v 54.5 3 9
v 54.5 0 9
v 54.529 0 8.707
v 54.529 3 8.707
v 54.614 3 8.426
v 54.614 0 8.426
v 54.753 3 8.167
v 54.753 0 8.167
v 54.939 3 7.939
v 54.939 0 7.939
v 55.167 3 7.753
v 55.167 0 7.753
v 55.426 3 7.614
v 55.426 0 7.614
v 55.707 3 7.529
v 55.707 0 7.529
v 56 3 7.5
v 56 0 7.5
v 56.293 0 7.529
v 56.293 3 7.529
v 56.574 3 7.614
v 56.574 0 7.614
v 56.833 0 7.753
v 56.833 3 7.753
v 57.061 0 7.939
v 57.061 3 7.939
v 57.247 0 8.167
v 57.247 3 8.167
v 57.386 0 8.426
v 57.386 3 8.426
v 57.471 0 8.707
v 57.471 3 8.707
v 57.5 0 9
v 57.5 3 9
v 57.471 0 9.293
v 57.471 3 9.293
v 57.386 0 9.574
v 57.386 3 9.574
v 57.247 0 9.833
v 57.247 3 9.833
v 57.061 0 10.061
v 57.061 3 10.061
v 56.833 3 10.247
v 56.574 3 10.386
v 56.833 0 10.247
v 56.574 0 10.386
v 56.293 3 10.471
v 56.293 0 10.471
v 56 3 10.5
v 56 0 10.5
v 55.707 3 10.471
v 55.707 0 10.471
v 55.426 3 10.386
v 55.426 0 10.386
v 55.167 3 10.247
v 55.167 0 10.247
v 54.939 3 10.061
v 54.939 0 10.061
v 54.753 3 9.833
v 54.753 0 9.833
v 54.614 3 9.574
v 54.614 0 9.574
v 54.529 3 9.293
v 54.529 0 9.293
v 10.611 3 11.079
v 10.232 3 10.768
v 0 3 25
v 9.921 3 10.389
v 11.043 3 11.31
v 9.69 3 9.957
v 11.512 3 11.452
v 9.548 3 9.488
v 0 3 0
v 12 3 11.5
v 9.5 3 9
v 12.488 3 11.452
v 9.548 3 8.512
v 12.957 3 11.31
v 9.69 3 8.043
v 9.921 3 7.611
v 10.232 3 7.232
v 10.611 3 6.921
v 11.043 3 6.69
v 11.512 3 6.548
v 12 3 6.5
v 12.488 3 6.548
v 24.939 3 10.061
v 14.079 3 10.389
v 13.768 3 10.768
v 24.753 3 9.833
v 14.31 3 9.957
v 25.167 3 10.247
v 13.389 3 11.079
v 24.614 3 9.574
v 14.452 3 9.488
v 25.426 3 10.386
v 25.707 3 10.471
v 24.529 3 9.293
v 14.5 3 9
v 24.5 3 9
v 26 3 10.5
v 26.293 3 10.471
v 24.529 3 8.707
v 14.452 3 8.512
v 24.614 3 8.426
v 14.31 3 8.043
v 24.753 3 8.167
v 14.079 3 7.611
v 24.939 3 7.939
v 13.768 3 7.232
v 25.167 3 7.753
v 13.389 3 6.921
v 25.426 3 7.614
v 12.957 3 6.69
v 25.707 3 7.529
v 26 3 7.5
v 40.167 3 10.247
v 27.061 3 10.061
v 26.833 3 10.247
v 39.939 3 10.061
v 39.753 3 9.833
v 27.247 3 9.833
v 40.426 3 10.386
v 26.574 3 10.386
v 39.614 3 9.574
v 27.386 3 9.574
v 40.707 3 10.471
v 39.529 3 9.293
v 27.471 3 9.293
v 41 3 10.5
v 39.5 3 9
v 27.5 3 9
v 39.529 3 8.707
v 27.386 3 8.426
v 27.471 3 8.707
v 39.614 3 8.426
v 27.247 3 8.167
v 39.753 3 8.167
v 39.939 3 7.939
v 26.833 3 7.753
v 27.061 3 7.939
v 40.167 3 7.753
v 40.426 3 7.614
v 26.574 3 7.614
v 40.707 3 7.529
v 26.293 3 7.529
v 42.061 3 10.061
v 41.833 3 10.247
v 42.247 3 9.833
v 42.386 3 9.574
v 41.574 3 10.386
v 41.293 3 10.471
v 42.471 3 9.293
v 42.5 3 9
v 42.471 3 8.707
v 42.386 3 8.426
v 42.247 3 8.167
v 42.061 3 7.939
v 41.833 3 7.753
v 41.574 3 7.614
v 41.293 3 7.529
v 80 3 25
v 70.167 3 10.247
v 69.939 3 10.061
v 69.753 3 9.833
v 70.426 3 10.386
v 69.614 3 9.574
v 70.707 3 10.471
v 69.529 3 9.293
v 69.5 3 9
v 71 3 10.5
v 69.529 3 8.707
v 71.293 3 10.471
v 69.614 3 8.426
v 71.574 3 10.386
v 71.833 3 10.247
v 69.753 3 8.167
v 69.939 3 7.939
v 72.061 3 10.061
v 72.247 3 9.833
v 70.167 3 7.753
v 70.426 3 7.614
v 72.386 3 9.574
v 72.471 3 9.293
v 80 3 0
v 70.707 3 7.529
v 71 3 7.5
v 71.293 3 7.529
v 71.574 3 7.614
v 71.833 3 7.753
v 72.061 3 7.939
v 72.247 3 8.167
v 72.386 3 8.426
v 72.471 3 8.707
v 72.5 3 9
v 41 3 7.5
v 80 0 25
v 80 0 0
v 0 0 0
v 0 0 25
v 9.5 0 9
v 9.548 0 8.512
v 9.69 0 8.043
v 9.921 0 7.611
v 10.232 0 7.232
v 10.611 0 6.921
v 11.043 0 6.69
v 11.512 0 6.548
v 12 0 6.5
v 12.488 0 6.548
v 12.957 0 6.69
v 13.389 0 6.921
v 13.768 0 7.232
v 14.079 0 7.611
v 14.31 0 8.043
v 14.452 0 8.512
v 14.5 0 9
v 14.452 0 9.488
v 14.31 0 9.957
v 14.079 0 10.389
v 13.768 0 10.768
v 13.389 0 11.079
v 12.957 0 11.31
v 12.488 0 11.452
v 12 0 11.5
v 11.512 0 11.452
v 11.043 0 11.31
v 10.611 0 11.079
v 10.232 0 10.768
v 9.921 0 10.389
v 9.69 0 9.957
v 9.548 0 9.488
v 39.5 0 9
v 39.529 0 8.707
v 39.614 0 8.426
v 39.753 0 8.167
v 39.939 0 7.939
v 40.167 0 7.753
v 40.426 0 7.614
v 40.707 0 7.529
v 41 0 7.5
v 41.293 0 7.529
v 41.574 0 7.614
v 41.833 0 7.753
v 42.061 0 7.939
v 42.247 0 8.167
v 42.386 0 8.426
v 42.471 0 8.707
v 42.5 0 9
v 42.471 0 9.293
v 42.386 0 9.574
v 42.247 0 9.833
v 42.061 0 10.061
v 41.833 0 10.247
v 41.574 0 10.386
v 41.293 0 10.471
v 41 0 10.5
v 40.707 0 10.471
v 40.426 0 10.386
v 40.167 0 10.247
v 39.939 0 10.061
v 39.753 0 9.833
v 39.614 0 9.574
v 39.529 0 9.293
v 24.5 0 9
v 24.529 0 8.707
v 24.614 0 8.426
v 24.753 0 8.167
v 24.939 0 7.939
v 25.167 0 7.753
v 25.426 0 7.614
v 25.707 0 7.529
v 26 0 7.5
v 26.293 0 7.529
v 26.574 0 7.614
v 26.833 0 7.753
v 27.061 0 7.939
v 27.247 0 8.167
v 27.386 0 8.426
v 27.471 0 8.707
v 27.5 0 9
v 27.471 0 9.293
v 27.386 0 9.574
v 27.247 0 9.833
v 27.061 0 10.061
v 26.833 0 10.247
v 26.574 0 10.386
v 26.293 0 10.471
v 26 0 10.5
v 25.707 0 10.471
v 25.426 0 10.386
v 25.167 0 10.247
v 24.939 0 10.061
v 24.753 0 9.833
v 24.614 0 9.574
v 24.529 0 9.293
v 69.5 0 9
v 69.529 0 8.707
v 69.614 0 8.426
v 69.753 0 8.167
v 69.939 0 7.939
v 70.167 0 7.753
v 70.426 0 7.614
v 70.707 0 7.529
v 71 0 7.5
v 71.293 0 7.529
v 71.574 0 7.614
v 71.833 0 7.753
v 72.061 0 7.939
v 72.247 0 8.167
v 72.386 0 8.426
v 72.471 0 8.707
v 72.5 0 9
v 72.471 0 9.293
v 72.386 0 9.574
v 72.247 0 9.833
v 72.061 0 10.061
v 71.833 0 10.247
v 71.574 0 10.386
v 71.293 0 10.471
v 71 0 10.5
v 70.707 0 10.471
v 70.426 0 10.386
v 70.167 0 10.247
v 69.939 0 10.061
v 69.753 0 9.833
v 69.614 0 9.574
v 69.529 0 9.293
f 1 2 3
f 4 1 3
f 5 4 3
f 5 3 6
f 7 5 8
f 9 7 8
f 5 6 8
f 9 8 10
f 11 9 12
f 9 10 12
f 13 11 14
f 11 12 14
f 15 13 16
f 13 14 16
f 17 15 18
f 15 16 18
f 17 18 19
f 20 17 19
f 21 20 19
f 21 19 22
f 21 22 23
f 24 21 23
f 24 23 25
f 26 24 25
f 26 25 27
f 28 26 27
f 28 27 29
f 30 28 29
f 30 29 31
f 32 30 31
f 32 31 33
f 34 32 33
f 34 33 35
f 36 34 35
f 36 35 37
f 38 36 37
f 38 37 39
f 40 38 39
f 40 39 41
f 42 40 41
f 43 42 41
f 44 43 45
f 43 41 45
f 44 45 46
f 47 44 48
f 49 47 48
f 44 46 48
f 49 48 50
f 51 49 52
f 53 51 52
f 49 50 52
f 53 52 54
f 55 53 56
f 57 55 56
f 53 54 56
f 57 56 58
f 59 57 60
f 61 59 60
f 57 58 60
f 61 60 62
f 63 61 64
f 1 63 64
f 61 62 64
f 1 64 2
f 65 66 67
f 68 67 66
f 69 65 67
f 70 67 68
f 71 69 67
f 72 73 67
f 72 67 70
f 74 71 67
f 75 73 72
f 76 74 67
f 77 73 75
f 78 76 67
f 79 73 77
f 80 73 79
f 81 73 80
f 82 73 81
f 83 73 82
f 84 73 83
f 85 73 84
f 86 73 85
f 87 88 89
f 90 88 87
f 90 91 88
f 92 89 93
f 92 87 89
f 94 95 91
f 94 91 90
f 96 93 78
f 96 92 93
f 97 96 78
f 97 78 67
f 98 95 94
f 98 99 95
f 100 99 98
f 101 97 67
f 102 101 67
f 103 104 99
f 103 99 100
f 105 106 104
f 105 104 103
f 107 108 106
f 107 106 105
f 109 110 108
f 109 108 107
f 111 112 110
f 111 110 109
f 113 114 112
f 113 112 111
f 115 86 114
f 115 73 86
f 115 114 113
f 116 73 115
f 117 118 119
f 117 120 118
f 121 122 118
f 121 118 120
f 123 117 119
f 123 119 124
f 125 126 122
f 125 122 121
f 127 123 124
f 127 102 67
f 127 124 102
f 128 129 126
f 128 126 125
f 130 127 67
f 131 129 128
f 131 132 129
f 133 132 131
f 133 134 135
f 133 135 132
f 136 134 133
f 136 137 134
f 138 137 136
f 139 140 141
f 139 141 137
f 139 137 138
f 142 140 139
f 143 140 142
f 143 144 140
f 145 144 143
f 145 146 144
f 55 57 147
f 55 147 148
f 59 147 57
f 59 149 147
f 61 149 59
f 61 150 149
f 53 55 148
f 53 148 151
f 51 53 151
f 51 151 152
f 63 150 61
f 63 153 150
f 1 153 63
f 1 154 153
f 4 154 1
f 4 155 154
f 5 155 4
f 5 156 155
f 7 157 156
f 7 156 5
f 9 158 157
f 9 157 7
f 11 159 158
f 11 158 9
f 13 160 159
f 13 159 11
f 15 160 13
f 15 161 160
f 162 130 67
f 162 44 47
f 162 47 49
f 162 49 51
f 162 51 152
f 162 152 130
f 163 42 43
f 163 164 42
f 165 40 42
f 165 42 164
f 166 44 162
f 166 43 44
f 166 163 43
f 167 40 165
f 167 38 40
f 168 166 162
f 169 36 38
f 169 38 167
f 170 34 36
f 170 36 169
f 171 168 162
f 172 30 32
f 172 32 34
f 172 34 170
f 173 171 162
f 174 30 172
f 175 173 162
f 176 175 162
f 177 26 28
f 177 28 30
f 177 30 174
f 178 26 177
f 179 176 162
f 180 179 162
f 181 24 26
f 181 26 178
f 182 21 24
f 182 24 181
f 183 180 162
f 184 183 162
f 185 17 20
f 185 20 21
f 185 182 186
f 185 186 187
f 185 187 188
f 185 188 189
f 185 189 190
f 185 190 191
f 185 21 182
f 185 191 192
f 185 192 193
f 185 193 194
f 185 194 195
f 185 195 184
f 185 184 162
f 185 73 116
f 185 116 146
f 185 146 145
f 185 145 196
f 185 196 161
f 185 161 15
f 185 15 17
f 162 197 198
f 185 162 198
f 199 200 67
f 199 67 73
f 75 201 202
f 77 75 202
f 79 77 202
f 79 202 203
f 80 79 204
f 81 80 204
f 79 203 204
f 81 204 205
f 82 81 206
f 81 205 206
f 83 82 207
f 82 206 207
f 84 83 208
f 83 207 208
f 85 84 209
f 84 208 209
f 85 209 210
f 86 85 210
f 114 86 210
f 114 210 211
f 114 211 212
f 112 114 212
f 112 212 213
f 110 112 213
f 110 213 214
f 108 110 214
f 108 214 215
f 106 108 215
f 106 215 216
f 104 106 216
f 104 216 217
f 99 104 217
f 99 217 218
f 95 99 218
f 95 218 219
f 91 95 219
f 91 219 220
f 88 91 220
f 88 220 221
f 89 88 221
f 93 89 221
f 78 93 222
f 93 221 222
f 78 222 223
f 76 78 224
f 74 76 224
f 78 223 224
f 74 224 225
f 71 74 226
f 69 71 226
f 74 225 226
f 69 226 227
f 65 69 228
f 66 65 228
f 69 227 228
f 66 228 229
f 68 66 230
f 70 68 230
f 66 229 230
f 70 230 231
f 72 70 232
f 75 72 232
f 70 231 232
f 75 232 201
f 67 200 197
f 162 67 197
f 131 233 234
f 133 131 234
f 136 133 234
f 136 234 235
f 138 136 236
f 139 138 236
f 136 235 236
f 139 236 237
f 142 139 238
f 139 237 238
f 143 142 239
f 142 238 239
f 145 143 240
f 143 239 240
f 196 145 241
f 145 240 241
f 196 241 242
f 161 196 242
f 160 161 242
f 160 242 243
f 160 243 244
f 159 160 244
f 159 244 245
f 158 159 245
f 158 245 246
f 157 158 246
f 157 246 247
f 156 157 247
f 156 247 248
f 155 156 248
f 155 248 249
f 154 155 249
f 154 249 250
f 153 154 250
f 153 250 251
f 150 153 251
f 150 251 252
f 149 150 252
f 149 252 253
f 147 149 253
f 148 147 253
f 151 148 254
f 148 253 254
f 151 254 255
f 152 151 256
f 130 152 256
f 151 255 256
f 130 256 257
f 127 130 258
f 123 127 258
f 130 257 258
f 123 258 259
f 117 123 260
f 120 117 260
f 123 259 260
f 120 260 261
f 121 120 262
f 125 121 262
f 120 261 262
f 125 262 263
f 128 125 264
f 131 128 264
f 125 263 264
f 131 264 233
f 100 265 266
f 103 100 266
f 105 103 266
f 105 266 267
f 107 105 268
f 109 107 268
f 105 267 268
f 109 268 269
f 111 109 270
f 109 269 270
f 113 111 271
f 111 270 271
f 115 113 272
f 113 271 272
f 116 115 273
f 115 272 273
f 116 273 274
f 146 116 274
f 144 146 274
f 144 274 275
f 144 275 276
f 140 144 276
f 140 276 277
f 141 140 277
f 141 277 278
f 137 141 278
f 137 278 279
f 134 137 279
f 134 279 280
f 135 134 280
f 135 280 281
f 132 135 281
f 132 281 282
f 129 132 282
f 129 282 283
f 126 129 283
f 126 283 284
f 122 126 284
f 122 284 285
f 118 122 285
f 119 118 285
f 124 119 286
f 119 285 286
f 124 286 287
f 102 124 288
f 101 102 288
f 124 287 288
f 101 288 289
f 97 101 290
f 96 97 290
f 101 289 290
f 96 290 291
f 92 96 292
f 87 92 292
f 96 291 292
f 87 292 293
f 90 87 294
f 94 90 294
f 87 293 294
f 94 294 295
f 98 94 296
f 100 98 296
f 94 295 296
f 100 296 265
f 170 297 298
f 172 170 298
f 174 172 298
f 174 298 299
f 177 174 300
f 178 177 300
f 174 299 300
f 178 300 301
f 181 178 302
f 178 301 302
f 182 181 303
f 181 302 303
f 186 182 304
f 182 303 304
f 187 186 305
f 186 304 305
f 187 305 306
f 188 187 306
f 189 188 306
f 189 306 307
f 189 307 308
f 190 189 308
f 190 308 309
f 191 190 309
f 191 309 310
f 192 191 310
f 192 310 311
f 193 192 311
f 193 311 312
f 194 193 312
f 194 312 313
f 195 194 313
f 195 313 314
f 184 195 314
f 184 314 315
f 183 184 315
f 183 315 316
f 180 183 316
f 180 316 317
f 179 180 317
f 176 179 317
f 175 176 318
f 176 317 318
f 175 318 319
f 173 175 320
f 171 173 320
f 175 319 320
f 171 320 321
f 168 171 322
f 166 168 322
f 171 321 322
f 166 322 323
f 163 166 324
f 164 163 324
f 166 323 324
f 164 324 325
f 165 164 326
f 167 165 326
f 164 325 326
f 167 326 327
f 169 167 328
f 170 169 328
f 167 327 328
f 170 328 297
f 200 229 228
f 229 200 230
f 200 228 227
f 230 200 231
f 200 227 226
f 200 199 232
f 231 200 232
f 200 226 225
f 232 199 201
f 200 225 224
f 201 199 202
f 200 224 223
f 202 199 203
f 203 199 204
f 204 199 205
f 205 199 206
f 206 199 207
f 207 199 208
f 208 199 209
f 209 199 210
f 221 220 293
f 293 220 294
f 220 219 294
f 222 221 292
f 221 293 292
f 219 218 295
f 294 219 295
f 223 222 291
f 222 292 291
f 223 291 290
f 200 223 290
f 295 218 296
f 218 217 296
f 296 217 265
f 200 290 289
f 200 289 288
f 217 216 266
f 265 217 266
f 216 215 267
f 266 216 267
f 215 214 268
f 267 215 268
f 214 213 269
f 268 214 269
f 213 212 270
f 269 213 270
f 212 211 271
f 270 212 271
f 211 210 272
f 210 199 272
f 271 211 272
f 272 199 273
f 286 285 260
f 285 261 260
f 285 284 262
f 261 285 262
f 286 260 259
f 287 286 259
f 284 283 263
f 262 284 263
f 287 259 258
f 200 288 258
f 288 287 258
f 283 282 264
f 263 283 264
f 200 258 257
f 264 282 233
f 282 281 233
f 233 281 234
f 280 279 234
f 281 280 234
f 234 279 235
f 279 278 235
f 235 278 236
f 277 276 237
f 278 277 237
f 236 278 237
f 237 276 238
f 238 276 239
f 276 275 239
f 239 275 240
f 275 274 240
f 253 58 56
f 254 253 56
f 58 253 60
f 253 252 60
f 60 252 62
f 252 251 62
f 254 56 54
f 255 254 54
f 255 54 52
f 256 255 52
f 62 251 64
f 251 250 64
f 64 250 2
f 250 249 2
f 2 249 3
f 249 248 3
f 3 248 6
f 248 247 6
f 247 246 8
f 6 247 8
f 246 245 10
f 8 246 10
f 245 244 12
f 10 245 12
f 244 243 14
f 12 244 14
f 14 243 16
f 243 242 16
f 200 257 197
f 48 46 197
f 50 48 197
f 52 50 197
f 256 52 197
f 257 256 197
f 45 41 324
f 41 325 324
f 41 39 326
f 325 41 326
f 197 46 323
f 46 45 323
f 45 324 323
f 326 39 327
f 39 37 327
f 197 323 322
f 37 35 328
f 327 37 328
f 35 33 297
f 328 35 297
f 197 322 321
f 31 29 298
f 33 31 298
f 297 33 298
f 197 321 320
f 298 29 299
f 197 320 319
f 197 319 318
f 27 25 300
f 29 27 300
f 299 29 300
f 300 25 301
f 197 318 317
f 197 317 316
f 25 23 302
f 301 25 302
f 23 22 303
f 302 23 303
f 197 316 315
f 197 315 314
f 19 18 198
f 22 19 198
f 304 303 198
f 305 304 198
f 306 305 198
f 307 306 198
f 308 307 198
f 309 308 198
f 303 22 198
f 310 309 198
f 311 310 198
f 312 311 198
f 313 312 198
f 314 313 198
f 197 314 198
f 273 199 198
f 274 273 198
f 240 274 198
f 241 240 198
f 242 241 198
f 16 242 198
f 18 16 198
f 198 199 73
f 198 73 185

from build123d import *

# Parameters (mm, degrees)
SKETCH1_W                   = 80
SKETCH1_H                   = 25
BOSS_EXTRUDE1_DEPTH         = 3
F_3_0MM_PRESS_DOWEL_HOLE1_D = 3
F_5_0MM_PRESS_DOWEL_HOLE1_D = 5


with BuildPart() as part:
    # Sketch1 → Boss-Extrude1 (new body)
    with BuildSketch(Plane(origin=(0, 0, 0), x_dir=(1, 0, 0), z_dir=(0, 1, 0))):
        with Locations((40, -12.5)):
            Rectangle(SKETCH1_W, SKETCH1_H)
    extrude(amount=BOSS_EXTRUDE1_DEPTH)

    # Ø3.0mm Press Dowel Hole1 (through all)
    with Locations(Plane(origin=(0, 3, 0), x_dir=(1, 0, 0), z_dir=(0, 1, 0))):
        with Locations((71, -9), (56, -9), (41, -9), (26, -9)):
            Hole(F_3_0MM_PRESS_DOWEL_HOLE1_D / 2)

    # Ø5.0mm Press Dowel Hole1 (through all)
    with Locations(Plane(origin=(0, 3, 0), x_dir=(1, 0, 0), z_dir=(0, 1, 0))):
        with Locations((12, -9)):
            Hole(F_5_0MM_PRESS_DOWEL_HOLE1_D / 2)


solid = part.part
